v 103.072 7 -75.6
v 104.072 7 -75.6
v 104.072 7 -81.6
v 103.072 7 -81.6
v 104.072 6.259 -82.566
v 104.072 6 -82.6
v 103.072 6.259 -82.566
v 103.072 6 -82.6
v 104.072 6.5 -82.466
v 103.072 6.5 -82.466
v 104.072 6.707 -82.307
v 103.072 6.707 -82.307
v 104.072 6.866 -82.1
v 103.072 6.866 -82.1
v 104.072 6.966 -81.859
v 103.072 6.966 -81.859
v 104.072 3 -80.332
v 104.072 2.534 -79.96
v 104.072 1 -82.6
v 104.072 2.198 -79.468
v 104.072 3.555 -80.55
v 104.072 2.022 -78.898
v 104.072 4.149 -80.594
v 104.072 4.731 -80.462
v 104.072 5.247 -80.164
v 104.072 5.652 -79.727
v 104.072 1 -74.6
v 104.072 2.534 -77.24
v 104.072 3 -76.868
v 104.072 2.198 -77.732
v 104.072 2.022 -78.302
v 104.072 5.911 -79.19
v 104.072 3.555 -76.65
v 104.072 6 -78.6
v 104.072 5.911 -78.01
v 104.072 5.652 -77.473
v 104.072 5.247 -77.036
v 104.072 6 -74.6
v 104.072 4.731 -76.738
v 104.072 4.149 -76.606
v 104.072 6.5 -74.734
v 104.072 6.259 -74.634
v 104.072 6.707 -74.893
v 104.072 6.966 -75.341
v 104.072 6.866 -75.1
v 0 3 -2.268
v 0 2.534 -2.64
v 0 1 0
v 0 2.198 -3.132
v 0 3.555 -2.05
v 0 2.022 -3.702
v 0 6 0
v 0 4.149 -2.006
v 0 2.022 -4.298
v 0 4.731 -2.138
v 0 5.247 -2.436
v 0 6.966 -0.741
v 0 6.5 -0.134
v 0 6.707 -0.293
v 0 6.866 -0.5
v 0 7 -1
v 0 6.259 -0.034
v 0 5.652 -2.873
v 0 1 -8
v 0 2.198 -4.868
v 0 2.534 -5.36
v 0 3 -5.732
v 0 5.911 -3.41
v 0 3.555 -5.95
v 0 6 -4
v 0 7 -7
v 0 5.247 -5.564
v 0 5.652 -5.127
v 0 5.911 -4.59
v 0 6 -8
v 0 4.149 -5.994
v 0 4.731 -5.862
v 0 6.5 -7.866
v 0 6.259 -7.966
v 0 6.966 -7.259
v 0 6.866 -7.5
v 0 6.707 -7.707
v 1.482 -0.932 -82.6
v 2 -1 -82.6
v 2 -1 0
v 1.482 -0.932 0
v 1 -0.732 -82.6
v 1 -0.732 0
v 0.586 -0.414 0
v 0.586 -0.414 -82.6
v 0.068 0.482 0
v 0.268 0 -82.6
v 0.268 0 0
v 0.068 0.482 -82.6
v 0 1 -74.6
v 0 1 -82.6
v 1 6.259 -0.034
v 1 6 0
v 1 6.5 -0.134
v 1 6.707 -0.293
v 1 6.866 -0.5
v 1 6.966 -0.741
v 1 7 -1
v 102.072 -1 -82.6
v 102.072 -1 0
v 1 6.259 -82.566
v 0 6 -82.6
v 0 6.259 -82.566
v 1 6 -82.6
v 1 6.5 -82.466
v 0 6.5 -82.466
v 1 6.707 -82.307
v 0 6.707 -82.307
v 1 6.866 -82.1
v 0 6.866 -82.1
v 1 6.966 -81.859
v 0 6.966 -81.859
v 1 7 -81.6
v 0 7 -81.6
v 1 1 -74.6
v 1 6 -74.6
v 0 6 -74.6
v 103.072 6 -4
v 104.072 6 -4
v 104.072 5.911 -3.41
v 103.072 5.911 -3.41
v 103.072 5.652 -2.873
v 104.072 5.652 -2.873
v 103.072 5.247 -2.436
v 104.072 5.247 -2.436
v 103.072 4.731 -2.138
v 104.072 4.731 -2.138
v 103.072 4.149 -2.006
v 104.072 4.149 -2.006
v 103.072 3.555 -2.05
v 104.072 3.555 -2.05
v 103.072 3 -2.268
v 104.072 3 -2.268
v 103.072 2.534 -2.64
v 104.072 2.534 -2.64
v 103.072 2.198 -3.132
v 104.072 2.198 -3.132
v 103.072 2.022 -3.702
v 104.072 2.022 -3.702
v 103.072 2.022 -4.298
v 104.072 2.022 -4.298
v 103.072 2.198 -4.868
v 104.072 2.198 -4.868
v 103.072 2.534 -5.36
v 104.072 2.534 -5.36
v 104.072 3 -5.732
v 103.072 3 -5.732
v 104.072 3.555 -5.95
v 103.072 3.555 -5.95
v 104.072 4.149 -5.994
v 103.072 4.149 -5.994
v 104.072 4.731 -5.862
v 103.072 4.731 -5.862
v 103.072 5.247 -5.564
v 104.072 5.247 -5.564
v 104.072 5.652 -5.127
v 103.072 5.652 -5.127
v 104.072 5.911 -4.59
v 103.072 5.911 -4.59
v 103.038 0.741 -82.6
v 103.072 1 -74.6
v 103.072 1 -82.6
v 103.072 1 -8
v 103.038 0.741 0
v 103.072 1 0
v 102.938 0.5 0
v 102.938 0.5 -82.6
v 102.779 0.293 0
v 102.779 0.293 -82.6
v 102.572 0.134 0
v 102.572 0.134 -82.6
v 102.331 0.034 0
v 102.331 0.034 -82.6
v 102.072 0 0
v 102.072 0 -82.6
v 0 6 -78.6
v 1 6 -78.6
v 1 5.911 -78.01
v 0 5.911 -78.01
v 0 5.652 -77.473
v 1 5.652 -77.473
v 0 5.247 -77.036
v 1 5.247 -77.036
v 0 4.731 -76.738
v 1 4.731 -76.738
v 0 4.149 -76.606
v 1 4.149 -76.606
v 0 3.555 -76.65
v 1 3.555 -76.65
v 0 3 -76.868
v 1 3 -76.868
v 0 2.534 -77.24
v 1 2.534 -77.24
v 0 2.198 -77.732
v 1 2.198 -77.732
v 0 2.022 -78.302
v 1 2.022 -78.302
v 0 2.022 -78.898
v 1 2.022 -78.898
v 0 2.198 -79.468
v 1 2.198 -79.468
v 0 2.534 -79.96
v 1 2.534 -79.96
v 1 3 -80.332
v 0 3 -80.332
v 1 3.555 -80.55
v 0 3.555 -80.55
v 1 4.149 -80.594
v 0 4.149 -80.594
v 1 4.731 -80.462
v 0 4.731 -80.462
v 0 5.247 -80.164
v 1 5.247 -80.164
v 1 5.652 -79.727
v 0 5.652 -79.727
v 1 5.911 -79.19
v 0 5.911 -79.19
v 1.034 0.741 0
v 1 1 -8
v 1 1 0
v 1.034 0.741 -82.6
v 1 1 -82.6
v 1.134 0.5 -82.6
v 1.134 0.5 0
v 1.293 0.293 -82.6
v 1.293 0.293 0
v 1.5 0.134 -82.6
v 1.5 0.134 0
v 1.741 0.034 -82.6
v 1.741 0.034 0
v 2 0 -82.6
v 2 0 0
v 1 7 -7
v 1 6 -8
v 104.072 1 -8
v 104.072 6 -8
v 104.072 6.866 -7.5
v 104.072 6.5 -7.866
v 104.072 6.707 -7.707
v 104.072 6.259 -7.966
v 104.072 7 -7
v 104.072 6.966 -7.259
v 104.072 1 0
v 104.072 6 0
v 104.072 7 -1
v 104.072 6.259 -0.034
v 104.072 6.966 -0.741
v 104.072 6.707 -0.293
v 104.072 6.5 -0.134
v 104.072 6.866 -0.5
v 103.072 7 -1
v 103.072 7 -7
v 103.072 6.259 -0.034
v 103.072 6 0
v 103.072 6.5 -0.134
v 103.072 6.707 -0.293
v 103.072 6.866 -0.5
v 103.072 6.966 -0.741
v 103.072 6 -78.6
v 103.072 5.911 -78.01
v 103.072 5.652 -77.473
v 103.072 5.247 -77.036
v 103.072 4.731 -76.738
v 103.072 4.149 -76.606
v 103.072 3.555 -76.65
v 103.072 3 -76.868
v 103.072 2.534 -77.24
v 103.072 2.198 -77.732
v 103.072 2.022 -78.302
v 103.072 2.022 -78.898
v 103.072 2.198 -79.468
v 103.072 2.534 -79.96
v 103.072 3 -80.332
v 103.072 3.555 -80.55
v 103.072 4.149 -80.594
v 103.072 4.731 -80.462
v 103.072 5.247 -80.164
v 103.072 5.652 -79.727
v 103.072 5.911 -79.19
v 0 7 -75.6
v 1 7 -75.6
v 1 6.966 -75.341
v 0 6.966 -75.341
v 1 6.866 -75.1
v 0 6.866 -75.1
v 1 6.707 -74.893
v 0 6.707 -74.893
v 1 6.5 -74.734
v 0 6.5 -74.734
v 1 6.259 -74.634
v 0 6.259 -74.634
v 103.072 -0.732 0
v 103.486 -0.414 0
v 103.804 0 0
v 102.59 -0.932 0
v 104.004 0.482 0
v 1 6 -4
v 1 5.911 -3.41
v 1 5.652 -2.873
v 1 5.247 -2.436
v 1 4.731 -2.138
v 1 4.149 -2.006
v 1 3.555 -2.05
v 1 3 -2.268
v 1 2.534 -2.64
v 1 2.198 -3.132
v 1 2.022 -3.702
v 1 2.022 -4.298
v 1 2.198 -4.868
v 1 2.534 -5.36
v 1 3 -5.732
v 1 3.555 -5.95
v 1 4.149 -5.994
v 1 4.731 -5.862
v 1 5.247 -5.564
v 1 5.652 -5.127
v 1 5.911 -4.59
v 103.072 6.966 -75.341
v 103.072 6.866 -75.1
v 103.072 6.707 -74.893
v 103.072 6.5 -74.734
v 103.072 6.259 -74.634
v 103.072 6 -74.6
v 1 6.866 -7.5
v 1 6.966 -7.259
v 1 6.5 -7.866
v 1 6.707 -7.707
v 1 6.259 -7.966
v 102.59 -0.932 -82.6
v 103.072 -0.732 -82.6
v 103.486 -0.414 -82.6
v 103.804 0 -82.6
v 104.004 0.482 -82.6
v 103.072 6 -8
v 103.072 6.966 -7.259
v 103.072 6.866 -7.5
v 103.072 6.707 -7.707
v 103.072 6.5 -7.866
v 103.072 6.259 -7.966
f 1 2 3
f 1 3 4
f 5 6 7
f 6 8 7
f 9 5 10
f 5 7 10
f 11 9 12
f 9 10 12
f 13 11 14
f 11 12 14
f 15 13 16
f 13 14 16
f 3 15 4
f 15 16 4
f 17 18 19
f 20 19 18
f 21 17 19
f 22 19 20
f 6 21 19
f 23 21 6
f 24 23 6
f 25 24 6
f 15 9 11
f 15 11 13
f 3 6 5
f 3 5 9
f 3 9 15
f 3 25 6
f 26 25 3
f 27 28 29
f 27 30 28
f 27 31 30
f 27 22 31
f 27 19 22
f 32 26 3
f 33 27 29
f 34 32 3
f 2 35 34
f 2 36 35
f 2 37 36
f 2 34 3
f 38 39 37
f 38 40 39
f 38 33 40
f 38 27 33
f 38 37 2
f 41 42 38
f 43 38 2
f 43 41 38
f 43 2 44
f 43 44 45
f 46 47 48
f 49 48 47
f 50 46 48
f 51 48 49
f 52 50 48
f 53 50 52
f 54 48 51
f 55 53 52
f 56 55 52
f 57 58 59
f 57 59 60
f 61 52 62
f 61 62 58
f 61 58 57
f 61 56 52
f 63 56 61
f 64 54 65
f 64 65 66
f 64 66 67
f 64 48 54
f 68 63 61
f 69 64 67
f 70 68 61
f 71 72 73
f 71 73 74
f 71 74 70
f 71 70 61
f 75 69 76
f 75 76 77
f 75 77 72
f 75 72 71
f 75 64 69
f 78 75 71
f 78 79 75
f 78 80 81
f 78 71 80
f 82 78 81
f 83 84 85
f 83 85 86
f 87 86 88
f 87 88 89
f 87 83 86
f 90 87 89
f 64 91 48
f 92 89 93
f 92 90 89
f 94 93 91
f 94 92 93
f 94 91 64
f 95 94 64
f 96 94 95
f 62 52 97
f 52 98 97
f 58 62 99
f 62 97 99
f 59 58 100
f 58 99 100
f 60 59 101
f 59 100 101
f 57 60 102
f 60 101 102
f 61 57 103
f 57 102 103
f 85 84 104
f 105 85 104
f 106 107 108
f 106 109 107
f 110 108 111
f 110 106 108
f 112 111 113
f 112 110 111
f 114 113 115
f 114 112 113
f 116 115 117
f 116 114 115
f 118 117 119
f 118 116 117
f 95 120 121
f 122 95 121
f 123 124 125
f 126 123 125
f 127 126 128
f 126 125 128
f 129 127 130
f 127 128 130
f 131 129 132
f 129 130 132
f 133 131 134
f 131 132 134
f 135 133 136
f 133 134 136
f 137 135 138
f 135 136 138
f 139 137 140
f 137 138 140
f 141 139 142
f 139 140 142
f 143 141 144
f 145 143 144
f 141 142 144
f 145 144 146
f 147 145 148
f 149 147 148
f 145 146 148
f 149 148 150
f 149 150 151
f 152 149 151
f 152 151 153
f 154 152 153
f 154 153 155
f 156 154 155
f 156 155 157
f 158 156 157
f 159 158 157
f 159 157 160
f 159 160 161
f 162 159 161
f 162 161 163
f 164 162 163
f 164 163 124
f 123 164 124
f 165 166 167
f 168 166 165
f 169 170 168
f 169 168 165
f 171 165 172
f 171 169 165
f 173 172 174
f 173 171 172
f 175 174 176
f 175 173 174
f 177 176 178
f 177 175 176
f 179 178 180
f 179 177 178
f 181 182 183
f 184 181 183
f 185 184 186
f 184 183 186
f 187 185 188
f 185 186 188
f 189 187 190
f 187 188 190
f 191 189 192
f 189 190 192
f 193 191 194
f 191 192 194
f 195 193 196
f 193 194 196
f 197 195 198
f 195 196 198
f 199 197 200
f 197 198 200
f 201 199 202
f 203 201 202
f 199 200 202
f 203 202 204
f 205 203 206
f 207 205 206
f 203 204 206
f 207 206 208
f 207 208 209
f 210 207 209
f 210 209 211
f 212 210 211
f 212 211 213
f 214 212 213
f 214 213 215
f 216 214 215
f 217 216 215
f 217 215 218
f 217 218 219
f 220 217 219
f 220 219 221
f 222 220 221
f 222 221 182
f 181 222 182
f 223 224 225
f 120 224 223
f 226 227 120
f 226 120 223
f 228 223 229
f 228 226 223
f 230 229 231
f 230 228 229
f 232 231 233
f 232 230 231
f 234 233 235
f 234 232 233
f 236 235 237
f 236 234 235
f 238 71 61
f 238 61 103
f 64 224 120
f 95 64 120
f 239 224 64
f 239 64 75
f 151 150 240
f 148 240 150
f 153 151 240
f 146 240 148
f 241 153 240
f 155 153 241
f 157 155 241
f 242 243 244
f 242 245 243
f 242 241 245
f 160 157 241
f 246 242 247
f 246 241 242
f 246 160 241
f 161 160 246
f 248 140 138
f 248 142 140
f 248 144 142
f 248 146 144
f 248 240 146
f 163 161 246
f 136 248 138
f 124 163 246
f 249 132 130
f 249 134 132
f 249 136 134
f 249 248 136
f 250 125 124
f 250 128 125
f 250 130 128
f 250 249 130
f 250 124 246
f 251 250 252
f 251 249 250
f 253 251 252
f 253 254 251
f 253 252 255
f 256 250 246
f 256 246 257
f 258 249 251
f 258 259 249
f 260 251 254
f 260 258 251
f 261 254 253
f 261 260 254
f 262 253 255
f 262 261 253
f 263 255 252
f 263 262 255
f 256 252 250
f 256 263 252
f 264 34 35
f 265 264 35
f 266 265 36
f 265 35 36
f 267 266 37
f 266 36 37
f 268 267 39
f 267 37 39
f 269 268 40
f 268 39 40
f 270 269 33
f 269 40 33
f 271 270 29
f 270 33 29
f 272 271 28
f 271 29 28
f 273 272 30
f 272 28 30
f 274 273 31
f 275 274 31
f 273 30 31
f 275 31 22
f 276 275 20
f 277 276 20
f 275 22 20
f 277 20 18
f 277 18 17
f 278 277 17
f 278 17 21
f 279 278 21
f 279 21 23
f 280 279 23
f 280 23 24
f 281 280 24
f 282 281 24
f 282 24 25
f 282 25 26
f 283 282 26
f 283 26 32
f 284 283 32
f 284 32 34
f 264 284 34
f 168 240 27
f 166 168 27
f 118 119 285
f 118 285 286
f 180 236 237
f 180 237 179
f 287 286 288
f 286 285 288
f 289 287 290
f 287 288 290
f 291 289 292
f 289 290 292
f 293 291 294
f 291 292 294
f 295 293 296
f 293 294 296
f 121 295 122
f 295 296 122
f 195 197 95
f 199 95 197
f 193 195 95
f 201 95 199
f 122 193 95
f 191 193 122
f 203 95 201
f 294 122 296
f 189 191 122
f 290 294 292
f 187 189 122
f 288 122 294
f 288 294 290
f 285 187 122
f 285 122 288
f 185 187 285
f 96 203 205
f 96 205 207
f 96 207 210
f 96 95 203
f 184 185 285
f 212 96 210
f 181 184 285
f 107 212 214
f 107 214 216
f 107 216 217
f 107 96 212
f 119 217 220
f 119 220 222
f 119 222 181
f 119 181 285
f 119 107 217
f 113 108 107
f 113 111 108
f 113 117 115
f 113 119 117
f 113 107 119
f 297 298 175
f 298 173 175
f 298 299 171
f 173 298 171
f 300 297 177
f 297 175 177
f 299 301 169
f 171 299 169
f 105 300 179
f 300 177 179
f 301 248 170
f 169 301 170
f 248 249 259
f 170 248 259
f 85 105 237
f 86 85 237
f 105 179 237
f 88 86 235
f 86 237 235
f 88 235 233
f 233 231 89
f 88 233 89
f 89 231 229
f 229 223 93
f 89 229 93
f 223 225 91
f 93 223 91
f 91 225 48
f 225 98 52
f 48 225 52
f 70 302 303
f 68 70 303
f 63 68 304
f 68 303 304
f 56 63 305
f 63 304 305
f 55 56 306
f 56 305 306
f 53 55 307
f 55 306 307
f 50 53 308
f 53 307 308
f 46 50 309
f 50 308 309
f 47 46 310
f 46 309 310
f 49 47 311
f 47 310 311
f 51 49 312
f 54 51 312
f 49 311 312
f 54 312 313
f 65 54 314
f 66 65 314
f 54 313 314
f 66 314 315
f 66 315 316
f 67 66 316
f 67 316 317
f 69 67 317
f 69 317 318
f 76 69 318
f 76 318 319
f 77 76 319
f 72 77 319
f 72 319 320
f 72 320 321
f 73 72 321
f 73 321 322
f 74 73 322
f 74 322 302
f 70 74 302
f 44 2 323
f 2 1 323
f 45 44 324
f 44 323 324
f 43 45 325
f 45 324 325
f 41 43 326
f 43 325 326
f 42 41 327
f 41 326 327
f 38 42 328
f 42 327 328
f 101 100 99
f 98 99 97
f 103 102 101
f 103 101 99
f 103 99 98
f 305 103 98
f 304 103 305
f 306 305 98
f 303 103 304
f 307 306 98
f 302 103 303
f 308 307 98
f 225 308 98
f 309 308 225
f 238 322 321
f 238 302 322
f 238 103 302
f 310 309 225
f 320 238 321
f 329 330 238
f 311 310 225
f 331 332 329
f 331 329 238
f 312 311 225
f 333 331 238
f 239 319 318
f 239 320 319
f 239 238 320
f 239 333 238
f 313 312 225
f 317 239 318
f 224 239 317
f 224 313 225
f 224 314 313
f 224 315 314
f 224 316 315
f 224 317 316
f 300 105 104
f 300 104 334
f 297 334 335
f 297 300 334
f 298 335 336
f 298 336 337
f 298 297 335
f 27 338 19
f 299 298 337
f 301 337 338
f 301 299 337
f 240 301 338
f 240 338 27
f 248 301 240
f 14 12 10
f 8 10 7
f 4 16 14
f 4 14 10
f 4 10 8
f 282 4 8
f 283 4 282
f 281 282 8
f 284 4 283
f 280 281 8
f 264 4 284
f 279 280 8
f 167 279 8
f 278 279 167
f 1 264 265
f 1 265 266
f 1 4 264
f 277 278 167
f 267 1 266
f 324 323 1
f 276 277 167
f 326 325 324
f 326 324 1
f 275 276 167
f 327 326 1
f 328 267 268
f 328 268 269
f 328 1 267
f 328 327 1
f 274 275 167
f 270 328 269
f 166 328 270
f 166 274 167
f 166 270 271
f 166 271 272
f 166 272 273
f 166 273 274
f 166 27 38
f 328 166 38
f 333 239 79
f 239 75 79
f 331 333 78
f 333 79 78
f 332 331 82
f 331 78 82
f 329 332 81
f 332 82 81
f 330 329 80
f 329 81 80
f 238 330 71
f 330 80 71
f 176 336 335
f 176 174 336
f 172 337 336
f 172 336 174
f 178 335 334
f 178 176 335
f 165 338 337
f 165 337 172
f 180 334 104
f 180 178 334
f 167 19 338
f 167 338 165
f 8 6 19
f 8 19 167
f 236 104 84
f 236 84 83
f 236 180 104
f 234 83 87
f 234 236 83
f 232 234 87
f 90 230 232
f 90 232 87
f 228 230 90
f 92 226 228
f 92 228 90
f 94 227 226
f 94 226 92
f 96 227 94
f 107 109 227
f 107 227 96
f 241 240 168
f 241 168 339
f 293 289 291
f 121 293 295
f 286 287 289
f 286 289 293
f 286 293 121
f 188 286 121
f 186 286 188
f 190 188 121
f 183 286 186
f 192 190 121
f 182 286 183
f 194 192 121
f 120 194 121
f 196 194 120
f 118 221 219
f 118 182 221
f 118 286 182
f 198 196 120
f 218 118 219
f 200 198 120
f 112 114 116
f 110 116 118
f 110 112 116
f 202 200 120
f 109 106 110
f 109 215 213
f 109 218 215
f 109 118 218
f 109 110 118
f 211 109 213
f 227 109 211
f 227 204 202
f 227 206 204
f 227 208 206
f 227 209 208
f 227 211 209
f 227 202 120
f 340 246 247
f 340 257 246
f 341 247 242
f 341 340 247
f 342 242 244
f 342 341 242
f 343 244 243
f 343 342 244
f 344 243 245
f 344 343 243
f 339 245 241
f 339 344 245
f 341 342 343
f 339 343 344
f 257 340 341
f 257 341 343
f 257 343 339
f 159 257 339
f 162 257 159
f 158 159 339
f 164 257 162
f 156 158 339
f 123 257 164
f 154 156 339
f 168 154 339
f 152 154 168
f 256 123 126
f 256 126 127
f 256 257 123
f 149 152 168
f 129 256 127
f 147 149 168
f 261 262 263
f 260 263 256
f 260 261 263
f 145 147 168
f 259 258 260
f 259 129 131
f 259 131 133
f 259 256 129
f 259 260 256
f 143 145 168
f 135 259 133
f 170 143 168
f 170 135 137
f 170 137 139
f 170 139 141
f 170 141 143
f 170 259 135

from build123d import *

# Parameters (mm, degrees)
SKETCH1_W                      = 104.072
SKETCH1_H                      = 82.6
BASE_FLANGE2_DEPTH             = 1
EDGE_FLANGE1_STRIP_W           = 6
EDGE_FLANGE1_STRIP_H           = 1
EDGE_FLANGE1_STRIP_CUT_DEPTH   = 82.6
EDGE_FLANGE1_STRIP_2_W         = 6
EDGE_FLANGE1_STRIP_2_H         = 1
EDGE_FLANGE1_STRIP_CUT_2_DEPTH = 82.6
EDGE_FLANGE1_DEPTH             = 82.6
EDGE_FLANGE1_BEND_DEPTH        = 82.6
SKETCH16_W                     = 66.6
SKETCH16_H                     = 7
CUT_EXTRUDE1_DEPTH             = 134.051648558
FILLET1_R                      = 1
SKETCH17_R                     = 2
CUT_EXTRUDE2_DEPTH             = 134.051648558


# Sheet-metal steps are written as plain solids
with BuildPart() as part:
    # Sketch1 → Base-Flange2 (new body)
    with BuildSketch(Plane(origin=(0, 0, 0), x_dir=(1, 0, 0), z_dir=(0, 1, 0))):
        with Locations((52.036, 41.3)):
            Rectangle(SKETCH1_W, SKETCH1_H)
    extrude(amount=-BASE_FLANGE2_DEPTH)

    # Edge-Flange1 strip (across the edge) → Edge-Flange1 strip cut (cut)
    with BuildSketch(Plane(origin=(104.072, 0, 0), x_dir=(-1, 0, 0), z_dir=(0, 0, -1))):
        with Locations((-1, -0.5)):
            Rectangle(EDGE_FLANGE1_STRIP_W, EDGE_FLANGE1_STRIP_H)
    extrude(amount=EDGE_FLANGE1_STRIP_CUT_DEPTH, mode=Mode.SUBTRACT)

    # Edge-Flange1 strip 2 (across the edge) → Edge-Flange1 strip cut 2 (cut)
    with BuildSketch(Plane.XY.offset(-82.6)):
        with Locations((-1, -0.5)):
            Rectangle(EDGE_FLANGE1_STRIP_2_W, EDGE_FLANGE1_STRIP_2_H)
    extrude(amount=EDGE_FLANGE1_STRIP_CUT_2_DEPTH, mode=Mode.SUBTRACT)

    # Edge-Flange1 section (across the edge) → Edge-Flange1 (add)
    with BuildSketch(Plane(origin=(104.072, 0, 0), x_dir=(-1, 0, 0), z_dir=(0, 0, -1))):
        with BuildLine():
            Line((0, 1), (0, 7))
            Line((0, 7), (1, 7))
            Line((1, 7), (1, 1))
            ThreePointArc((1, 1), (1.292893219, 0.292893219), (2, 0))
            Line((2, 0), (2, -1))
            ThreePointArc((2, -1), (0.585786438, -0.414213562), (0, 1))
        make_face()
    extrude(amount=EDGE_FLANGE1_DEPTH)

    # Edge-Flange1 section 2 (across the edge) → Edge-Flange1 bend (add)
    with BuildSketch(Plane.XY.offset(-82.6)):
        with BuildLine():
            Line((0, 1), (0, 7))
            Line((0, 7), (1, 7))
            Line((1, 7), (1, 1))
            ThreePointArc((1, 1), (1.292893219, 0.292893219), (2, 0))
            Line((2, 0), (2, -1))
            ThreePointArc((2, -1), (0.585786438, -0.414213562), (0, 1))
        make_face()
    extrude(amount=EDGE_FLANGE1_BEND_DEPTH)

    # Sketch16 → Cut-Extrude1 (cut, through all)
    with BuildSketch(Plane(origin=(104.072, 0, 0), x_dir=(0, 0, -1), z_dir=(1, 0, 0))):
        with Locations((41.3, 4.5)):
            Rectangle(SKETCH16_W, SKETCH16_H)
    extrude(amount=-CUT_EXTRUDE1_DEPTH, mode=Mode.SUBTRACT)

    # Fillet1
    fillet1_edges = [part.edges().sort_by_distance(p)[0] for p in [
        (103.572, 7, 0),
        (103.572, 7, -82.6),
        (0.5, 7, -82.6),
        (0.5, 7, 0),
        (0.5, 7, -74.6),
        (0.5, 7, -8),
        (103.572, 7, -8),
        (103.572, 7, -74.6),
    ]]
    fillet(fillet1_edges, radius=FILLET1_R)

    # Sketch17 → Cut-Extrude2 (cut, through all)
    with BuildSketch(Plane(origin=(104.072, 0, 0), x_dir=(0, 0, -1), z_dir=(1, 0, 0))):
        with Locations(Location((4, 4, 0), (0, 0, 90))):
            Circle(SKETCH17_R)
        with Locations(Location((78.6, 4, 0), (0, 0, 90))):
            Circle(SKETCH17_R)
    extrude(amount=-CUT_EXTRUDE2_DEPTH, mode=Mode.SUBTRACT)


solid = part.part
